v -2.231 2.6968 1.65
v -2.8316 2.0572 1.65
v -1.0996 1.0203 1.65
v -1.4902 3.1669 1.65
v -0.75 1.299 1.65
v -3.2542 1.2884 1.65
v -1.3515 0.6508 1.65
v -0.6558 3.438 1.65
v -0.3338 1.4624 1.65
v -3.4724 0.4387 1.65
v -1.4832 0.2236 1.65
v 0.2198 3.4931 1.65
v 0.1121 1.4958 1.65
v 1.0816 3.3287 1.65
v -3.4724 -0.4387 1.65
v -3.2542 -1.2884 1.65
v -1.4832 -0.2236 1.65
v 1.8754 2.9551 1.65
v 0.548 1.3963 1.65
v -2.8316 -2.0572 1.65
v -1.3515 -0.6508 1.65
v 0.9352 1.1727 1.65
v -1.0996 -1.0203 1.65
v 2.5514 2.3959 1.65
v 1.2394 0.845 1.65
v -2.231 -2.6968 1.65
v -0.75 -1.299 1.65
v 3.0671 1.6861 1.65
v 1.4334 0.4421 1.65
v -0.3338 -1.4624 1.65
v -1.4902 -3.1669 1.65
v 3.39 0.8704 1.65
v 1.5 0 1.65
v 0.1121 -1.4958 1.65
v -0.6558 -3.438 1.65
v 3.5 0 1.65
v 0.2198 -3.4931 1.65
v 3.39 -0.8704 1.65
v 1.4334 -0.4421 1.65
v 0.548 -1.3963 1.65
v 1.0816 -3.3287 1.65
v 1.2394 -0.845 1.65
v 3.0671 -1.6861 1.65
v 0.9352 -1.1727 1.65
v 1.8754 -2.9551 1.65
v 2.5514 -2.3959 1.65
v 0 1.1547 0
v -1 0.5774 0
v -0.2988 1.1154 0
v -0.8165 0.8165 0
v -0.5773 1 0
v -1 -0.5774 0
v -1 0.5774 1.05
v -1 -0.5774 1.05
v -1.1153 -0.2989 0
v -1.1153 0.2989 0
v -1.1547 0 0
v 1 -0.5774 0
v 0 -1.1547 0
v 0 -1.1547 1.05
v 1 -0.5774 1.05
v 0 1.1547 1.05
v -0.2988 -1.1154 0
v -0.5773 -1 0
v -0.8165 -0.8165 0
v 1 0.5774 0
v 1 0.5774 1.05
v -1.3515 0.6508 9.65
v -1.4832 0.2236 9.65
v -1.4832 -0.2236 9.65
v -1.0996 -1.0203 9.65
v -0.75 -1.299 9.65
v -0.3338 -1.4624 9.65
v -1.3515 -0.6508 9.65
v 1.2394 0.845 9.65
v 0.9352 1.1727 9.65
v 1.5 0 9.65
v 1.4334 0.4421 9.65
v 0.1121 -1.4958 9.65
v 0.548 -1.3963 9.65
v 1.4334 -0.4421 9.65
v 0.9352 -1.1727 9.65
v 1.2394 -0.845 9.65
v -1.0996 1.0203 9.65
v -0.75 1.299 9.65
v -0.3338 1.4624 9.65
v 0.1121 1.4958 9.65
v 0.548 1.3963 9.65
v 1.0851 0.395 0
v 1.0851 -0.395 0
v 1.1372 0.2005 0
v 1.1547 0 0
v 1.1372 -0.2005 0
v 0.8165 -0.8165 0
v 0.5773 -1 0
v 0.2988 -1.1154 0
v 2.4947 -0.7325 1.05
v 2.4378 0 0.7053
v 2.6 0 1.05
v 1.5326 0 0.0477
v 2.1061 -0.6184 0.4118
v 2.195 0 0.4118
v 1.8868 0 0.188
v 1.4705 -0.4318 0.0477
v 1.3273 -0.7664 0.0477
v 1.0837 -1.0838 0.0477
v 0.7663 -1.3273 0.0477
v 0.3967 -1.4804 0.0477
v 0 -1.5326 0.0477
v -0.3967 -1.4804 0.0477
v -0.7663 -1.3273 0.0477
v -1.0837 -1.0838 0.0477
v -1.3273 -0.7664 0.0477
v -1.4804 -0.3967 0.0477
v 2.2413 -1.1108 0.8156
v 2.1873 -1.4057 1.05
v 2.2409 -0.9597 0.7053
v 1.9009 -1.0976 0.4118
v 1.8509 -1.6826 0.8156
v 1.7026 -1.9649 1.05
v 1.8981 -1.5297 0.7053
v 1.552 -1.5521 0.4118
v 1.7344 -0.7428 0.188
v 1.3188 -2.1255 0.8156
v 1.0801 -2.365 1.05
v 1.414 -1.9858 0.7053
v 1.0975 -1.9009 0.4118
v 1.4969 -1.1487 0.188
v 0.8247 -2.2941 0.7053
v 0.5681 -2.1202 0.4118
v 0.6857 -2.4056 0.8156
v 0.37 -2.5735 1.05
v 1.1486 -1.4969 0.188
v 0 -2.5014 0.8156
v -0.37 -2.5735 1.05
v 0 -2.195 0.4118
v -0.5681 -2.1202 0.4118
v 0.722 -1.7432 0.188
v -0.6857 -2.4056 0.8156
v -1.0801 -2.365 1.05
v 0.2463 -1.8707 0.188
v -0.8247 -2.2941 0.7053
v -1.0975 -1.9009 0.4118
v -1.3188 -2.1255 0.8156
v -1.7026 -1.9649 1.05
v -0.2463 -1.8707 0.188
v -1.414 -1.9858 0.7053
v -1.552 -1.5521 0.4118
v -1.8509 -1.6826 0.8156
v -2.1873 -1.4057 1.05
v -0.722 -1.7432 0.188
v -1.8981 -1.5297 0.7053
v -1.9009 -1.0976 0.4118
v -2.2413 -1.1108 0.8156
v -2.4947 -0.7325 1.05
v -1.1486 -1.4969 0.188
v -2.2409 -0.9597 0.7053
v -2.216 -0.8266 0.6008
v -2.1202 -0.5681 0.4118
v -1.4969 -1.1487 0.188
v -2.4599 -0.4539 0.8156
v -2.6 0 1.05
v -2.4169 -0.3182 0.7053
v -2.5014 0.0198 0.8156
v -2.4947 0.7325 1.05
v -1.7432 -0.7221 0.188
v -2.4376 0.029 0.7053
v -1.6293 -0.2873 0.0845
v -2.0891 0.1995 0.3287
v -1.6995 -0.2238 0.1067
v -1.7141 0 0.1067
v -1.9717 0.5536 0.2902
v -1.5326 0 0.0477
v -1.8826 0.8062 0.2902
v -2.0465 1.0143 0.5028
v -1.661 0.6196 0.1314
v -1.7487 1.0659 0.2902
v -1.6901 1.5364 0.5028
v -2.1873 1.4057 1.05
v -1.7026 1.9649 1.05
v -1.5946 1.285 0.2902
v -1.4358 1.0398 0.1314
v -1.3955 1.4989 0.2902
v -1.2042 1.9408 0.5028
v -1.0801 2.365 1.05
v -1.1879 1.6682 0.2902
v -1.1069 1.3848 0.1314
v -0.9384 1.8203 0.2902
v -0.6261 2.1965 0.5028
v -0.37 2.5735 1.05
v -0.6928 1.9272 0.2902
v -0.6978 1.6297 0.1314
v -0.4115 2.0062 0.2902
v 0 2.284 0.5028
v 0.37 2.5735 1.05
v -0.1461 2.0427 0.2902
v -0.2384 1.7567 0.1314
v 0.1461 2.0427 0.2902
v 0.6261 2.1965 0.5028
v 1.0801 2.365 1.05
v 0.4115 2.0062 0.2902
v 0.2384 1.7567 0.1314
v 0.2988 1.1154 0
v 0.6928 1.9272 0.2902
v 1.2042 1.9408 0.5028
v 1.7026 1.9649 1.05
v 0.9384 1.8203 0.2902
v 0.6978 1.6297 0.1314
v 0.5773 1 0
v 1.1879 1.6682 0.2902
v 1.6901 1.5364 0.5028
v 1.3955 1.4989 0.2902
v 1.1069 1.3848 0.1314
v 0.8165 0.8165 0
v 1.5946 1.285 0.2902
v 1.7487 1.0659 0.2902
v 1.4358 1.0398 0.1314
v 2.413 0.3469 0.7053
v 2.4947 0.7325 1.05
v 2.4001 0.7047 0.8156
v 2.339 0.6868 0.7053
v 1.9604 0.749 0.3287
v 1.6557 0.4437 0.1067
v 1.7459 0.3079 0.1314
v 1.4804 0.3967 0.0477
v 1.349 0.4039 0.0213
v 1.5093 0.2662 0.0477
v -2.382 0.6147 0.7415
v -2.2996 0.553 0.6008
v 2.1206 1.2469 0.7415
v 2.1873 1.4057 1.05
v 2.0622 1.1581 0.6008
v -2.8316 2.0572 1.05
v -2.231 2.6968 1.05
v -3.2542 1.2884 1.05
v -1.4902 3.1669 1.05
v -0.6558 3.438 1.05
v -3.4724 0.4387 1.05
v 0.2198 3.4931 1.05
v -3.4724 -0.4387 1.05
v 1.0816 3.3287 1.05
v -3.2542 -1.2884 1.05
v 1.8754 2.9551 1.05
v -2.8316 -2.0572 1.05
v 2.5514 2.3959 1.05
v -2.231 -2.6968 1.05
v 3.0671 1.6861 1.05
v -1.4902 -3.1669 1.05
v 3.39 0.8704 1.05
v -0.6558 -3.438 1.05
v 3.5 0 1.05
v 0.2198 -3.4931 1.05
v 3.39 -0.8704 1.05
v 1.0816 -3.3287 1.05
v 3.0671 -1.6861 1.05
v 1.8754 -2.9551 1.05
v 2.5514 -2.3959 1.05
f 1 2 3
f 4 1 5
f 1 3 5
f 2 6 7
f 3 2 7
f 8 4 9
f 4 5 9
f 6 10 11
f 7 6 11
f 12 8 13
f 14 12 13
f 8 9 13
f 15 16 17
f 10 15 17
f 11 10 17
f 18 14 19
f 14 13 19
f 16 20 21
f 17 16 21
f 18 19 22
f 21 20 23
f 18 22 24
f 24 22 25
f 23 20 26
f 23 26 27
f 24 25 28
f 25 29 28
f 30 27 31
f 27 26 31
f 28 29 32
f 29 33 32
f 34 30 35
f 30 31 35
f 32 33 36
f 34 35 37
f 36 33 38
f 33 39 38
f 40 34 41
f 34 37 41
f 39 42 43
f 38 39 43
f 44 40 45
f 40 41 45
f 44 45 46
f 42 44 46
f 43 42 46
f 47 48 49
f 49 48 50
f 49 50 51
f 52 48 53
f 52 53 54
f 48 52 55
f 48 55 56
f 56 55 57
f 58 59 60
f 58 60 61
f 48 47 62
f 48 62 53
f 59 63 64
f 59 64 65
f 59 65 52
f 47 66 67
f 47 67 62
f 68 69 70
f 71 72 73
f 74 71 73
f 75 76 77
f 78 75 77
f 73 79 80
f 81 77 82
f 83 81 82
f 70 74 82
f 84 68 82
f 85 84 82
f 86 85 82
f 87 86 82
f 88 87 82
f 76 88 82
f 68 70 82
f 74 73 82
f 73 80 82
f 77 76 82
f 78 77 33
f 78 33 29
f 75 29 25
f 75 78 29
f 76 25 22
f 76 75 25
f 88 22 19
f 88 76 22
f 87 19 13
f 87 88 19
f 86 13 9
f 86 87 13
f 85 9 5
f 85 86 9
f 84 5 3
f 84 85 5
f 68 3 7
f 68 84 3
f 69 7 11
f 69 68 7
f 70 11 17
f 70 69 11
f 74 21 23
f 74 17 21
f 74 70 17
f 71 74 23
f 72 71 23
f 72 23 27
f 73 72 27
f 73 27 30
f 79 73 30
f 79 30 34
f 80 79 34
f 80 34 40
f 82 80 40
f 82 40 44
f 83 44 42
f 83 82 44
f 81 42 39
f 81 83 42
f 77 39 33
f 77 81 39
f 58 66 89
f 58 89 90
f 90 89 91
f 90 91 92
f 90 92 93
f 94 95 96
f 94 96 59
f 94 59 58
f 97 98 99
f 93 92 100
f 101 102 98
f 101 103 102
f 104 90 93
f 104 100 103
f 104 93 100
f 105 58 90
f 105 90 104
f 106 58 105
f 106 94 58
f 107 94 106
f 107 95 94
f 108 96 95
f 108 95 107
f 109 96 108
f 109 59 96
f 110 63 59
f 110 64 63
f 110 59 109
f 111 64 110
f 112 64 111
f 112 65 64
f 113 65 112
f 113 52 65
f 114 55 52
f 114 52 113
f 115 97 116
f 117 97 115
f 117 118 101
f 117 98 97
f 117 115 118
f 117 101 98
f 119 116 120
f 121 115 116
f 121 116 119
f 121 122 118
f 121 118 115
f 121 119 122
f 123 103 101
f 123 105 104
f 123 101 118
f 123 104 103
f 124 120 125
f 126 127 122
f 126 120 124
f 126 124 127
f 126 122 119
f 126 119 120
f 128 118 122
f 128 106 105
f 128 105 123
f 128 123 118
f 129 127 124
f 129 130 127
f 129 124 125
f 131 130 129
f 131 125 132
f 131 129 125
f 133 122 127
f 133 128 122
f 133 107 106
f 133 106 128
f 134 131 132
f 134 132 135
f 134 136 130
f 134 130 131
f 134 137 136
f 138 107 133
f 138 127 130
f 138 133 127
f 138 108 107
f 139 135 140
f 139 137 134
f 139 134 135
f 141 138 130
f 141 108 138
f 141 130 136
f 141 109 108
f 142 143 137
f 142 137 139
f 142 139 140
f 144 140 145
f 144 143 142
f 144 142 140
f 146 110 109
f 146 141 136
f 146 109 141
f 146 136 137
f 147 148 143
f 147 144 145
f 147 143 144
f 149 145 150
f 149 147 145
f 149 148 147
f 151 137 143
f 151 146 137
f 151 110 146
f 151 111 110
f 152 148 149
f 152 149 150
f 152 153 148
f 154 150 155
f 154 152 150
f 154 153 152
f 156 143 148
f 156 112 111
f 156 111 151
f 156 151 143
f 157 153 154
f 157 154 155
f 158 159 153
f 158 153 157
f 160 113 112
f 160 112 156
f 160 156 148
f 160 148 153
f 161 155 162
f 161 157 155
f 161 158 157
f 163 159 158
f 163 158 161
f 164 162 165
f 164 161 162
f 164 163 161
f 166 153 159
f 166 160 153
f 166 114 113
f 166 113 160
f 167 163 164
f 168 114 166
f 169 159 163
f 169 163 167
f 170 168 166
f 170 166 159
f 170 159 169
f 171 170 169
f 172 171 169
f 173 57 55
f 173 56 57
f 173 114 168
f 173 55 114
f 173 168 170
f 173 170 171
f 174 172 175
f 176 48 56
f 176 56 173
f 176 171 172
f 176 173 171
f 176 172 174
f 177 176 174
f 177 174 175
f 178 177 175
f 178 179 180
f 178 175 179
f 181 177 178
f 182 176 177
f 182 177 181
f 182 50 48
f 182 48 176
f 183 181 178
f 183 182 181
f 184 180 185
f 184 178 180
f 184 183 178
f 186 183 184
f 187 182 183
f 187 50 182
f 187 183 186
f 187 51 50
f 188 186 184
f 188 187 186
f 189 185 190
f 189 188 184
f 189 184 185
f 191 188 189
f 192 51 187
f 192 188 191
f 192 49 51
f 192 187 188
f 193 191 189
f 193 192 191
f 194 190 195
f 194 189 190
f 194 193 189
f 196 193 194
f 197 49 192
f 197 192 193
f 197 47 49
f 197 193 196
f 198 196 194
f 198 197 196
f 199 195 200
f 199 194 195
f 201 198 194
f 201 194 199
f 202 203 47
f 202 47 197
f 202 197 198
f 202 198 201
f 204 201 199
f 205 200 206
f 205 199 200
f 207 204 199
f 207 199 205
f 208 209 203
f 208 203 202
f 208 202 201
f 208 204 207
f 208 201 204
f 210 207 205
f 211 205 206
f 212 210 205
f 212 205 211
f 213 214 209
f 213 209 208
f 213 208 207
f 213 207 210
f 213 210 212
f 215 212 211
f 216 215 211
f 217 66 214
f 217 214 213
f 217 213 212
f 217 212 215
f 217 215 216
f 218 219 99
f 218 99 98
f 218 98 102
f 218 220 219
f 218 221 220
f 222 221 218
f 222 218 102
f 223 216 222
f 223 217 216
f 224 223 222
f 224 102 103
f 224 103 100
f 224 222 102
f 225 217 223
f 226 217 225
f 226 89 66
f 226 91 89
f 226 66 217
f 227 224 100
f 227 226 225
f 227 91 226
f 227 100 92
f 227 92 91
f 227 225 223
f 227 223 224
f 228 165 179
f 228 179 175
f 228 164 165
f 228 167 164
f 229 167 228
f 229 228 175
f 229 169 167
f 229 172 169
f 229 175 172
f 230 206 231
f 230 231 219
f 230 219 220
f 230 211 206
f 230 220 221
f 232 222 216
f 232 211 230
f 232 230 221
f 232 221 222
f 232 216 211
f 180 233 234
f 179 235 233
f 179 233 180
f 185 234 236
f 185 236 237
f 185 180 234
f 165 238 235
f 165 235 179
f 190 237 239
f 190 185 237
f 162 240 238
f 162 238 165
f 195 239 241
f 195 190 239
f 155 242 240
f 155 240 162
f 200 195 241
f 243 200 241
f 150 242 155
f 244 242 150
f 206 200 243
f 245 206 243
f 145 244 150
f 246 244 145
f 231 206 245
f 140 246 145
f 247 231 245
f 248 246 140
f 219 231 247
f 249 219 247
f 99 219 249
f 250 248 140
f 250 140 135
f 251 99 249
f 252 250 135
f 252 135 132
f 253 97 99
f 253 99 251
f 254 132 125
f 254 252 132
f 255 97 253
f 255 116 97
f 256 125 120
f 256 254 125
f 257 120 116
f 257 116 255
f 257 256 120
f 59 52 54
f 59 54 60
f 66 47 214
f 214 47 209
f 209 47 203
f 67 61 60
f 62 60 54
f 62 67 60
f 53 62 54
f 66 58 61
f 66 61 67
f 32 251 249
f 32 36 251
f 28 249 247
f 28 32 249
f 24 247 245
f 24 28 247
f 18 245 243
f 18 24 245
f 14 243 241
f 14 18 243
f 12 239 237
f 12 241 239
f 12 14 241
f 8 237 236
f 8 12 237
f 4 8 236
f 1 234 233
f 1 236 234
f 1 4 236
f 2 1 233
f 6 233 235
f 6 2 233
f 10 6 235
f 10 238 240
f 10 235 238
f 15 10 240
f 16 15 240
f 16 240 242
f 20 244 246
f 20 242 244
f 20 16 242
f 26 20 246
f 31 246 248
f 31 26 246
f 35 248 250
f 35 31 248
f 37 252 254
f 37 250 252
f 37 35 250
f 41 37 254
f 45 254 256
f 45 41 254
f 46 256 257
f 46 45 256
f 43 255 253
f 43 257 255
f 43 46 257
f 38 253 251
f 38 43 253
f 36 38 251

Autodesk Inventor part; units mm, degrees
ref_plane "YZ Plane" through (0, 0, 0) normal (1, 0, 0) x (0, 1, 0)
ref_plane "XZ Plane" through (0, 0, 0) normal (0, 1, 0) x (-1, 0, 0)
ref_plane "XY Plane" through (0, 0, 0) normal (0, 0, 1) x (1, 0, 0)
sketch "スケッチ1" plane through (0, 0, 0) normal (0, 1, 0) x (-1, 0, 0)
  line L0 (0, 0) -> (-1.1547, 0)
  line L1 (-2.6, 1.05) -> (-3.5, 1.05)
  line L2 (-3.5, 1.05) -> (-3.5, 1.65)
  line L3 (-3.5, 1.65) -> (-1.5, 1.65)
  line L4 (-1.5, 1.65) -> (-1.5, 9.65)
  line L5 (-1.5, 9.65) -> (0, 9.65)
  line L6 (0, 9.65) -> (0, 0)
  arc A0 (-2.6, 1.05) -> (-1.1547, 0) centre (-1.1547, 1.5197) ccw
  dimension "d0" = 5.2
  dimension "d1" = 7
  dimension "d3" = 1.65
  dimension "d4" = 0.6
  dimension "d5" = 2.3094
  dimension "d6" = 8
  dimension "d7" = 3
revolve "回転1" add sketch "スケッチ1" angle 360 about axis through (0, 0, 9.65) along (0, 0, -1)
thread "ねじ1" size "M3x0.5" class "6g" standard "ANSI Metric M Profile" length 7.57
sketch "スケッチ2" plane through (0, 0, 0) normal (0, 0, -1) x (-1, 0, 0)
  circle A0 centre (0, 0) radius 1.1547 projected
  line L0 (0, 1.1547) -> (1, 0.5774)
  line L1 (1, 0.5774) -> (1, -0.5774)
  line L2 (1, -0.5774) -> (0, -1.1547)
  line L3 (0, -1.1547) -> (-1, -0.5774)
  line L4 (-1, -0.5774) -> (-1, 0.5774)
  line L5 (-1, 0.5774) -> (0, 1.1547)
  point P0 (0, 0)
extrude "押し出し1" cut sketch "スケッチ2" against normal blind 1.05 contours L1 L2 L3 L4 L5 L0
properties part number "620103008" material "ステンレス鋼 AISI 304"
